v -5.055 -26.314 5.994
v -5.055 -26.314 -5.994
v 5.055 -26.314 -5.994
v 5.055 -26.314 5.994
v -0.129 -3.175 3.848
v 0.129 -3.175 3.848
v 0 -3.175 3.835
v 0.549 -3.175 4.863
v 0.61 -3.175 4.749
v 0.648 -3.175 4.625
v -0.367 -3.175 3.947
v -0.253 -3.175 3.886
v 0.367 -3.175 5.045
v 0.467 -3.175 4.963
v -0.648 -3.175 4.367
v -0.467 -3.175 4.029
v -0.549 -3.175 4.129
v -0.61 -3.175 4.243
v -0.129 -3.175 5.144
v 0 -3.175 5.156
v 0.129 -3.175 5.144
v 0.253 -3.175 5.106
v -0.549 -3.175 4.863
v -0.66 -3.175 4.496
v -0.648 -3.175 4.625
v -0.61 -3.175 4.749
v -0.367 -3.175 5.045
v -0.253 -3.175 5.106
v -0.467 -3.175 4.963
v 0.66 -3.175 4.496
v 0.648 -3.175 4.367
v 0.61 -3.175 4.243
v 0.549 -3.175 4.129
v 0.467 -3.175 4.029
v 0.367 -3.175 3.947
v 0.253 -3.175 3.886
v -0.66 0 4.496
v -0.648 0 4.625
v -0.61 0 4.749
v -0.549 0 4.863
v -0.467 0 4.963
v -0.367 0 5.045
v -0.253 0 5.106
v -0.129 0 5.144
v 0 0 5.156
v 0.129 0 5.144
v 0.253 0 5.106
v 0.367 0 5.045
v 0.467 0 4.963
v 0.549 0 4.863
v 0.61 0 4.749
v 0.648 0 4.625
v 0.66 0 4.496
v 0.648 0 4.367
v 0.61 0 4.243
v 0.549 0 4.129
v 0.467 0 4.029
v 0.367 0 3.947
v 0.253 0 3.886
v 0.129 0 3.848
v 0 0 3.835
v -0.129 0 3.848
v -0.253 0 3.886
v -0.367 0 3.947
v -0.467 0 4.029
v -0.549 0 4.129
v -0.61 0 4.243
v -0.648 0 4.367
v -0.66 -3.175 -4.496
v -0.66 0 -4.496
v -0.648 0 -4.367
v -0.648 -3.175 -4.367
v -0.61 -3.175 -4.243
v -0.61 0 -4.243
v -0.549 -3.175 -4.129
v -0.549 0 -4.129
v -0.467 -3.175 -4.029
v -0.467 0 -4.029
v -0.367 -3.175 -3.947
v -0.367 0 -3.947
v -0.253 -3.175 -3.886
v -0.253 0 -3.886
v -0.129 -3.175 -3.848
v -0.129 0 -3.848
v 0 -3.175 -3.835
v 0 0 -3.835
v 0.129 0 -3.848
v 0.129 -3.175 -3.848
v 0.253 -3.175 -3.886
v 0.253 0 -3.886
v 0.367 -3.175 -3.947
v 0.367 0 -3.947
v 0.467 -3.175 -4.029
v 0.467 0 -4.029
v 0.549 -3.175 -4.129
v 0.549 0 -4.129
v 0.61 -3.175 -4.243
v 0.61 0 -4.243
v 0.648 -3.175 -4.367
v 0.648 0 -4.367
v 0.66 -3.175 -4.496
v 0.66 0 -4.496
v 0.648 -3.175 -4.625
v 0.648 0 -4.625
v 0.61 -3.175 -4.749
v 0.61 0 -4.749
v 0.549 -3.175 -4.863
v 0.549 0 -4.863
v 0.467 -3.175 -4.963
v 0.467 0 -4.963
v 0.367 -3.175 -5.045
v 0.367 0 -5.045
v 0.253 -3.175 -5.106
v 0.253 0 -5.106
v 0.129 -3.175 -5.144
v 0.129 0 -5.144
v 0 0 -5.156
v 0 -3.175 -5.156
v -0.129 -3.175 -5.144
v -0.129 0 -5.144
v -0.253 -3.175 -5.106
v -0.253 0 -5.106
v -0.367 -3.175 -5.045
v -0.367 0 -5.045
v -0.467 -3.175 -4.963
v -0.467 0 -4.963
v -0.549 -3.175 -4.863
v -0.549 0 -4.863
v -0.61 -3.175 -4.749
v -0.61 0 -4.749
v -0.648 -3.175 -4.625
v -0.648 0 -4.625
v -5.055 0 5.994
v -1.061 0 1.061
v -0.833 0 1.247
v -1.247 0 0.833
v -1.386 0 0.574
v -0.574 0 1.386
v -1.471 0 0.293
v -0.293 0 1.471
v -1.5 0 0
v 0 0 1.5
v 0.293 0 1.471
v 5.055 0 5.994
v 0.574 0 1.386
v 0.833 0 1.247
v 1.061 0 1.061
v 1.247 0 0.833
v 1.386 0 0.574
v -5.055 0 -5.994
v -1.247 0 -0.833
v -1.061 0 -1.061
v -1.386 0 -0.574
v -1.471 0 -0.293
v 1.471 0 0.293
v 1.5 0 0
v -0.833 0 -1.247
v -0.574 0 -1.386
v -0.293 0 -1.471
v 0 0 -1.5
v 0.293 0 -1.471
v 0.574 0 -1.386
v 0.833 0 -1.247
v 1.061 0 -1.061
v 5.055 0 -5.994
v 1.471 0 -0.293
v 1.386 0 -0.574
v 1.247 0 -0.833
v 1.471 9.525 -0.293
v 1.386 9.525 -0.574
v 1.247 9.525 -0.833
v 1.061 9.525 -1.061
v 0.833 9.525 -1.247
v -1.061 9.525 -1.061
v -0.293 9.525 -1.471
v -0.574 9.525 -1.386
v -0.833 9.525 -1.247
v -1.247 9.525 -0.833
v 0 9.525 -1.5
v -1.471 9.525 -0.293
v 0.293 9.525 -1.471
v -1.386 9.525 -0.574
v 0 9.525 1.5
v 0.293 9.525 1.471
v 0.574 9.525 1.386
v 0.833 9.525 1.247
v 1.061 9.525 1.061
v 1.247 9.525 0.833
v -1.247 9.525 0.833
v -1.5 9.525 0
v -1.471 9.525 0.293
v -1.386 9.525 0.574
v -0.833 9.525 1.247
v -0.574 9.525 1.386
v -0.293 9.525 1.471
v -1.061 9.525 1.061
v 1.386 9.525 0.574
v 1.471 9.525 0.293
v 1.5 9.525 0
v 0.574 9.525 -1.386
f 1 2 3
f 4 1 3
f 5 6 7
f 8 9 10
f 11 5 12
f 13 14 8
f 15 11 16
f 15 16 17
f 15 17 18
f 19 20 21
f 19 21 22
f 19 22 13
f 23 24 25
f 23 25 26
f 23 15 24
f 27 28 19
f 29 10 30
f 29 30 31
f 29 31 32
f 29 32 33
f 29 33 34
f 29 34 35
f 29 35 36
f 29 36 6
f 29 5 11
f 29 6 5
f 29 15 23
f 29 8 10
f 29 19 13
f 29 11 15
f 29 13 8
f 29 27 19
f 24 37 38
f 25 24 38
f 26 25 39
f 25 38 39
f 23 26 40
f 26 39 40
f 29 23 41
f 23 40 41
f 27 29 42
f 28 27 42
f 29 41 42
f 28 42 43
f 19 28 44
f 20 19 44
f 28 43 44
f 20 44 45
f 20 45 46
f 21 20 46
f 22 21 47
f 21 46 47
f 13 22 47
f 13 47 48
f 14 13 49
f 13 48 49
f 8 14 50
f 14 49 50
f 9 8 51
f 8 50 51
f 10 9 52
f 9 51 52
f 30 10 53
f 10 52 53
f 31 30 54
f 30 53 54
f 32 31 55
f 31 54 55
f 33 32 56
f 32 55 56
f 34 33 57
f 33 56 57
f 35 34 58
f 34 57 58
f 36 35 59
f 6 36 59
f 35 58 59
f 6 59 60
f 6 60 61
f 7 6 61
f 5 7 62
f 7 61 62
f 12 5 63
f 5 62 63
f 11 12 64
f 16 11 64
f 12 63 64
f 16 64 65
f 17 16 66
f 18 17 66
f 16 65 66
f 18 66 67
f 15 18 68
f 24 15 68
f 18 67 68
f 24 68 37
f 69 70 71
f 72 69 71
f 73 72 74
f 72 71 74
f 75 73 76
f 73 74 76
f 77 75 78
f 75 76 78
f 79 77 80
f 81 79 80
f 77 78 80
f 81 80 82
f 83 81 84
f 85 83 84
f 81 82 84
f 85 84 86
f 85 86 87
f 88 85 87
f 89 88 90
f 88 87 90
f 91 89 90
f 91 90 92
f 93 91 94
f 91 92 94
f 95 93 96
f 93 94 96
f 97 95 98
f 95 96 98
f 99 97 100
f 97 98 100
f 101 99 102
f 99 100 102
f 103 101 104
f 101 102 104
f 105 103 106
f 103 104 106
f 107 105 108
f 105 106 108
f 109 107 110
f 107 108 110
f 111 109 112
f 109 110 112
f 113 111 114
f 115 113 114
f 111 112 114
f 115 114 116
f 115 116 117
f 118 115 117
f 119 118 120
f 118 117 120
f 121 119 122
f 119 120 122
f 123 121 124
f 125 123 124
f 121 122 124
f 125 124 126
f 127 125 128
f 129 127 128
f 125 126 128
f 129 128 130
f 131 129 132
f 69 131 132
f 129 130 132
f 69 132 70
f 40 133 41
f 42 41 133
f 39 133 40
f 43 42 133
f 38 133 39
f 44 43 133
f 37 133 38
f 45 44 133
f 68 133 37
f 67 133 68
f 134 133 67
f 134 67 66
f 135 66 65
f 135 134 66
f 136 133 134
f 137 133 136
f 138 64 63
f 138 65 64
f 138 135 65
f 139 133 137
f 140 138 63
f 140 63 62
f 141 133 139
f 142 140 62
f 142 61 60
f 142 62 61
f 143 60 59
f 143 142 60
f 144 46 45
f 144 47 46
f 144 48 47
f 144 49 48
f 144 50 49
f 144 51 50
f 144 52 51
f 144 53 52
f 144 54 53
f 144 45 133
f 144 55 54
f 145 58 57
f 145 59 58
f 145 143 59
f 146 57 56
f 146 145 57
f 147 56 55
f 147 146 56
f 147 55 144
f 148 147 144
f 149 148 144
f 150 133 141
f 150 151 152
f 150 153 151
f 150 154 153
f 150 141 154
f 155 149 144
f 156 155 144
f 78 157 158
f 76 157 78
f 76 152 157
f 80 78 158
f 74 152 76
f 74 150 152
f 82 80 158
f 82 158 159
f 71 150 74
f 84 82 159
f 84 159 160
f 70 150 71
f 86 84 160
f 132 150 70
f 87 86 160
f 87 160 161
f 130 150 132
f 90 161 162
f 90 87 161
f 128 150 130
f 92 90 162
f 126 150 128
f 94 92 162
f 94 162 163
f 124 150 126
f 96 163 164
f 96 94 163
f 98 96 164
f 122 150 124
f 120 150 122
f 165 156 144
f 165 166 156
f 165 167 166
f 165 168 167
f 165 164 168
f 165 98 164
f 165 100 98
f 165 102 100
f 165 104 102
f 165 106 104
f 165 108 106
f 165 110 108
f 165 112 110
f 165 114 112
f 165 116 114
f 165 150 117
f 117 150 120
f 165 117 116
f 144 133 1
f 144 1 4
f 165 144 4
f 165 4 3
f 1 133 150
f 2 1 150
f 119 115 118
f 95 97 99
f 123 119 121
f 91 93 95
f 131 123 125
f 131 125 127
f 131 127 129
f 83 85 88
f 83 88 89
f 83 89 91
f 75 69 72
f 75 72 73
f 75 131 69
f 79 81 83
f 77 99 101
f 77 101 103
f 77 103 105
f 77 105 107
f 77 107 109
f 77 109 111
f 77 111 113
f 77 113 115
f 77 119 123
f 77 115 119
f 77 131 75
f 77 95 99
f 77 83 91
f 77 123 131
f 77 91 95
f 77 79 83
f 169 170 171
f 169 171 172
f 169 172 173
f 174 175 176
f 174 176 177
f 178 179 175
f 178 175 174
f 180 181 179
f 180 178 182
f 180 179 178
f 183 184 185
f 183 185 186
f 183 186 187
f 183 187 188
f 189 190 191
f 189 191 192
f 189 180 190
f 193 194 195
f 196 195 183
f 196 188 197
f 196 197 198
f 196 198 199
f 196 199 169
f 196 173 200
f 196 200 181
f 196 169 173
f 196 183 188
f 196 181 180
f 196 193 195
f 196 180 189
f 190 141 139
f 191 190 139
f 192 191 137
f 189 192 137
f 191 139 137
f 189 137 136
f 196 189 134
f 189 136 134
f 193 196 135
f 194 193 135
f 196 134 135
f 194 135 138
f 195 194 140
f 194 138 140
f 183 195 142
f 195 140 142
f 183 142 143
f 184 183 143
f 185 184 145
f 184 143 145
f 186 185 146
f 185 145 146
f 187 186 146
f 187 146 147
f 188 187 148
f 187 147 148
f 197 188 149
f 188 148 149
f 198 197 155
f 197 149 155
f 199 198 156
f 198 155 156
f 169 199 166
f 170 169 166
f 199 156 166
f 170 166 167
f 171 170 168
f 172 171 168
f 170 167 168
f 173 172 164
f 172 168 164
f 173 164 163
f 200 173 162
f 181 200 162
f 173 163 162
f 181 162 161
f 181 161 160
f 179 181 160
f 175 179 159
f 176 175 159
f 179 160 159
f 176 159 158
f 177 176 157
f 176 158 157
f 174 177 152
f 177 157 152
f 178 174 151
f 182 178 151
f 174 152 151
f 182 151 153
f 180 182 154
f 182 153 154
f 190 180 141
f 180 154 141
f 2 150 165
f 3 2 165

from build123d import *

# Parameters (mm, degrees)
SKETCH1_W          = 10.1092
SKETCH1_H          = 11.9888
EXTRUDE1_DEPTH     = 26.3144
SKETCH2_R          = 1.5
EXTRUDE2_DEPTH     = 9.525
SKETCH3_R          = 0.6604
CUT_EXTRUDE1_DEPTH = 3.175


with BuildPart() as part:
    # Sketch1 → Extrude1 (new body)
    with BuildSketch(Plane(origin=(0, 0, 0), x_dir=(1, 0, 0), z_dir=(0, 1, 0))):
        Rectangle(SKETCH1_W, SKETCH1_H)
    extrude(amount=-EXTRUDE1_DEPTH)

    # Sketch2 → Extrude2 (add)
    with BuildSketch(Plane(origin=(0, 0, 0), x_dir=(-1, 0, 0), z_dir=(0, 1, 0))):
        Circle(SKETCH2_R)
    extrude(amount=EXTRUDE2_DEPTH)

    # Sketch3 → Cut-Extrude1 (cut)
    with BuildSketch(Plane(origin=(0, 0, 0), x_dir=(-1, 0, 0), z_dir=(0, 1, 0))):
        with Locations((0, 4.4958)):
            Circle(SKETCH3_R)
        with Locations((0, -4.4958)):
            Circle(SKETCH3_R)
    extrude(amount=-CUT_EXTRUDE1_DEPTH, mode=Mode.SUBTRACT)


solid = part.part
